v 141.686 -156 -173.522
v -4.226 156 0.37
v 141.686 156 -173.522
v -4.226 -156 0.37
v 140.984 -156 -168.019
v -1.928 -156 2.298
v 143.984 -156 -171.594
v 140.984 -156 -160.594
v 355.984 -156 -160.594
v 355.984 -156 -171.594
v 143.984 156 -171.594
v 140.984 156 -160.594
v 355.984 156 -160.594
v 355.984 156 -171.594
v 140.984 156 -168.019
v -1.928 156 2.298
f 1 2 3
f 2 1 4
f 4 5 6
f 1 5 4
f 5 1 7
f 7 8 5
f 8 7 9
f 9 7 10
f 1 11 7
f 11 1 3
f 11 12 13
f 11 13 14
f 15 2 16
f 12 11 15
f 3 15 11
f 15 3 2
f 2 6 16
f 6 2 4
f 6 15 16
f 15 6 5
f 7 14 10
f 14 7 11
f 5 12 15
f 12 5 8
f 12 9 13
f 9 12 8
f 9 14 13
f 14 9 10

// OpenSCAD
/*
NOTE: 
- Measurements were made rounded to nearest mm with enforced symmetry. As the microphone spacing measurements do not necessarily add up to the overall width measurements. Microphones are usually <1mm thick so the outermost microphone spacing measurements can be adjusted to match the desired width if necessary
- 'x' represents microphones
- 'wide' is the width for both screen and keyboard panels
- 'screen height' is the distance from top of screen to hinge. Some devices have additional panel past the hinge, but this is behind the KB so can probably be ignored.
- 'KB deep' is distance from front of device (trackpad end) to the hinge
- 'KB thick' is distance from desk to top (keyboard side) of the thickest part of KB section
- Therefore actual microphone position relative to the desk would be veritical distance based on screen height to hinge based on the screen angle, plus the thickness of the the KB.
*/

/*
L13YogaGen1

312 wide

Mics 3mm from top
|--128--x--54--x--128--|

Screen height: 216 to hinge

KB
215 deep
11mm thick
*/

body_width = 312;
kb_depth = 215;
kb_thickness = 11;

mic_distance_from_top = 3;
screen_thickness = 3;
screen_height = 216;
screen_angle = 50;
translate([(screen_height + kb_thickness - mic_distance_from_top) * cos(screen_angle), 0, -(screen_height + kb_thickness - mic_distance_from_top) * sin(screen_angle)]) {
rotate([0, screen_angle - 90, 0]) {
translate([-screen_thickness/2, 0, 0]) {
    linear_extrude(height=(screen_height + kb_thickness)) {
        square([screen_thickness, body_width], center=true);
    }
}
}

rotate([0, 0, 0]) {
    translate([kb_depth/2 - screen_thickness, 0, 0]) {
        linear_extrude(height=kb_thickness) {
            square([kb_depth, body_width], center=true);
        }
    }
}
}
//

//rotate([0, screen_angle - 90, 0]) {
//    
//}
